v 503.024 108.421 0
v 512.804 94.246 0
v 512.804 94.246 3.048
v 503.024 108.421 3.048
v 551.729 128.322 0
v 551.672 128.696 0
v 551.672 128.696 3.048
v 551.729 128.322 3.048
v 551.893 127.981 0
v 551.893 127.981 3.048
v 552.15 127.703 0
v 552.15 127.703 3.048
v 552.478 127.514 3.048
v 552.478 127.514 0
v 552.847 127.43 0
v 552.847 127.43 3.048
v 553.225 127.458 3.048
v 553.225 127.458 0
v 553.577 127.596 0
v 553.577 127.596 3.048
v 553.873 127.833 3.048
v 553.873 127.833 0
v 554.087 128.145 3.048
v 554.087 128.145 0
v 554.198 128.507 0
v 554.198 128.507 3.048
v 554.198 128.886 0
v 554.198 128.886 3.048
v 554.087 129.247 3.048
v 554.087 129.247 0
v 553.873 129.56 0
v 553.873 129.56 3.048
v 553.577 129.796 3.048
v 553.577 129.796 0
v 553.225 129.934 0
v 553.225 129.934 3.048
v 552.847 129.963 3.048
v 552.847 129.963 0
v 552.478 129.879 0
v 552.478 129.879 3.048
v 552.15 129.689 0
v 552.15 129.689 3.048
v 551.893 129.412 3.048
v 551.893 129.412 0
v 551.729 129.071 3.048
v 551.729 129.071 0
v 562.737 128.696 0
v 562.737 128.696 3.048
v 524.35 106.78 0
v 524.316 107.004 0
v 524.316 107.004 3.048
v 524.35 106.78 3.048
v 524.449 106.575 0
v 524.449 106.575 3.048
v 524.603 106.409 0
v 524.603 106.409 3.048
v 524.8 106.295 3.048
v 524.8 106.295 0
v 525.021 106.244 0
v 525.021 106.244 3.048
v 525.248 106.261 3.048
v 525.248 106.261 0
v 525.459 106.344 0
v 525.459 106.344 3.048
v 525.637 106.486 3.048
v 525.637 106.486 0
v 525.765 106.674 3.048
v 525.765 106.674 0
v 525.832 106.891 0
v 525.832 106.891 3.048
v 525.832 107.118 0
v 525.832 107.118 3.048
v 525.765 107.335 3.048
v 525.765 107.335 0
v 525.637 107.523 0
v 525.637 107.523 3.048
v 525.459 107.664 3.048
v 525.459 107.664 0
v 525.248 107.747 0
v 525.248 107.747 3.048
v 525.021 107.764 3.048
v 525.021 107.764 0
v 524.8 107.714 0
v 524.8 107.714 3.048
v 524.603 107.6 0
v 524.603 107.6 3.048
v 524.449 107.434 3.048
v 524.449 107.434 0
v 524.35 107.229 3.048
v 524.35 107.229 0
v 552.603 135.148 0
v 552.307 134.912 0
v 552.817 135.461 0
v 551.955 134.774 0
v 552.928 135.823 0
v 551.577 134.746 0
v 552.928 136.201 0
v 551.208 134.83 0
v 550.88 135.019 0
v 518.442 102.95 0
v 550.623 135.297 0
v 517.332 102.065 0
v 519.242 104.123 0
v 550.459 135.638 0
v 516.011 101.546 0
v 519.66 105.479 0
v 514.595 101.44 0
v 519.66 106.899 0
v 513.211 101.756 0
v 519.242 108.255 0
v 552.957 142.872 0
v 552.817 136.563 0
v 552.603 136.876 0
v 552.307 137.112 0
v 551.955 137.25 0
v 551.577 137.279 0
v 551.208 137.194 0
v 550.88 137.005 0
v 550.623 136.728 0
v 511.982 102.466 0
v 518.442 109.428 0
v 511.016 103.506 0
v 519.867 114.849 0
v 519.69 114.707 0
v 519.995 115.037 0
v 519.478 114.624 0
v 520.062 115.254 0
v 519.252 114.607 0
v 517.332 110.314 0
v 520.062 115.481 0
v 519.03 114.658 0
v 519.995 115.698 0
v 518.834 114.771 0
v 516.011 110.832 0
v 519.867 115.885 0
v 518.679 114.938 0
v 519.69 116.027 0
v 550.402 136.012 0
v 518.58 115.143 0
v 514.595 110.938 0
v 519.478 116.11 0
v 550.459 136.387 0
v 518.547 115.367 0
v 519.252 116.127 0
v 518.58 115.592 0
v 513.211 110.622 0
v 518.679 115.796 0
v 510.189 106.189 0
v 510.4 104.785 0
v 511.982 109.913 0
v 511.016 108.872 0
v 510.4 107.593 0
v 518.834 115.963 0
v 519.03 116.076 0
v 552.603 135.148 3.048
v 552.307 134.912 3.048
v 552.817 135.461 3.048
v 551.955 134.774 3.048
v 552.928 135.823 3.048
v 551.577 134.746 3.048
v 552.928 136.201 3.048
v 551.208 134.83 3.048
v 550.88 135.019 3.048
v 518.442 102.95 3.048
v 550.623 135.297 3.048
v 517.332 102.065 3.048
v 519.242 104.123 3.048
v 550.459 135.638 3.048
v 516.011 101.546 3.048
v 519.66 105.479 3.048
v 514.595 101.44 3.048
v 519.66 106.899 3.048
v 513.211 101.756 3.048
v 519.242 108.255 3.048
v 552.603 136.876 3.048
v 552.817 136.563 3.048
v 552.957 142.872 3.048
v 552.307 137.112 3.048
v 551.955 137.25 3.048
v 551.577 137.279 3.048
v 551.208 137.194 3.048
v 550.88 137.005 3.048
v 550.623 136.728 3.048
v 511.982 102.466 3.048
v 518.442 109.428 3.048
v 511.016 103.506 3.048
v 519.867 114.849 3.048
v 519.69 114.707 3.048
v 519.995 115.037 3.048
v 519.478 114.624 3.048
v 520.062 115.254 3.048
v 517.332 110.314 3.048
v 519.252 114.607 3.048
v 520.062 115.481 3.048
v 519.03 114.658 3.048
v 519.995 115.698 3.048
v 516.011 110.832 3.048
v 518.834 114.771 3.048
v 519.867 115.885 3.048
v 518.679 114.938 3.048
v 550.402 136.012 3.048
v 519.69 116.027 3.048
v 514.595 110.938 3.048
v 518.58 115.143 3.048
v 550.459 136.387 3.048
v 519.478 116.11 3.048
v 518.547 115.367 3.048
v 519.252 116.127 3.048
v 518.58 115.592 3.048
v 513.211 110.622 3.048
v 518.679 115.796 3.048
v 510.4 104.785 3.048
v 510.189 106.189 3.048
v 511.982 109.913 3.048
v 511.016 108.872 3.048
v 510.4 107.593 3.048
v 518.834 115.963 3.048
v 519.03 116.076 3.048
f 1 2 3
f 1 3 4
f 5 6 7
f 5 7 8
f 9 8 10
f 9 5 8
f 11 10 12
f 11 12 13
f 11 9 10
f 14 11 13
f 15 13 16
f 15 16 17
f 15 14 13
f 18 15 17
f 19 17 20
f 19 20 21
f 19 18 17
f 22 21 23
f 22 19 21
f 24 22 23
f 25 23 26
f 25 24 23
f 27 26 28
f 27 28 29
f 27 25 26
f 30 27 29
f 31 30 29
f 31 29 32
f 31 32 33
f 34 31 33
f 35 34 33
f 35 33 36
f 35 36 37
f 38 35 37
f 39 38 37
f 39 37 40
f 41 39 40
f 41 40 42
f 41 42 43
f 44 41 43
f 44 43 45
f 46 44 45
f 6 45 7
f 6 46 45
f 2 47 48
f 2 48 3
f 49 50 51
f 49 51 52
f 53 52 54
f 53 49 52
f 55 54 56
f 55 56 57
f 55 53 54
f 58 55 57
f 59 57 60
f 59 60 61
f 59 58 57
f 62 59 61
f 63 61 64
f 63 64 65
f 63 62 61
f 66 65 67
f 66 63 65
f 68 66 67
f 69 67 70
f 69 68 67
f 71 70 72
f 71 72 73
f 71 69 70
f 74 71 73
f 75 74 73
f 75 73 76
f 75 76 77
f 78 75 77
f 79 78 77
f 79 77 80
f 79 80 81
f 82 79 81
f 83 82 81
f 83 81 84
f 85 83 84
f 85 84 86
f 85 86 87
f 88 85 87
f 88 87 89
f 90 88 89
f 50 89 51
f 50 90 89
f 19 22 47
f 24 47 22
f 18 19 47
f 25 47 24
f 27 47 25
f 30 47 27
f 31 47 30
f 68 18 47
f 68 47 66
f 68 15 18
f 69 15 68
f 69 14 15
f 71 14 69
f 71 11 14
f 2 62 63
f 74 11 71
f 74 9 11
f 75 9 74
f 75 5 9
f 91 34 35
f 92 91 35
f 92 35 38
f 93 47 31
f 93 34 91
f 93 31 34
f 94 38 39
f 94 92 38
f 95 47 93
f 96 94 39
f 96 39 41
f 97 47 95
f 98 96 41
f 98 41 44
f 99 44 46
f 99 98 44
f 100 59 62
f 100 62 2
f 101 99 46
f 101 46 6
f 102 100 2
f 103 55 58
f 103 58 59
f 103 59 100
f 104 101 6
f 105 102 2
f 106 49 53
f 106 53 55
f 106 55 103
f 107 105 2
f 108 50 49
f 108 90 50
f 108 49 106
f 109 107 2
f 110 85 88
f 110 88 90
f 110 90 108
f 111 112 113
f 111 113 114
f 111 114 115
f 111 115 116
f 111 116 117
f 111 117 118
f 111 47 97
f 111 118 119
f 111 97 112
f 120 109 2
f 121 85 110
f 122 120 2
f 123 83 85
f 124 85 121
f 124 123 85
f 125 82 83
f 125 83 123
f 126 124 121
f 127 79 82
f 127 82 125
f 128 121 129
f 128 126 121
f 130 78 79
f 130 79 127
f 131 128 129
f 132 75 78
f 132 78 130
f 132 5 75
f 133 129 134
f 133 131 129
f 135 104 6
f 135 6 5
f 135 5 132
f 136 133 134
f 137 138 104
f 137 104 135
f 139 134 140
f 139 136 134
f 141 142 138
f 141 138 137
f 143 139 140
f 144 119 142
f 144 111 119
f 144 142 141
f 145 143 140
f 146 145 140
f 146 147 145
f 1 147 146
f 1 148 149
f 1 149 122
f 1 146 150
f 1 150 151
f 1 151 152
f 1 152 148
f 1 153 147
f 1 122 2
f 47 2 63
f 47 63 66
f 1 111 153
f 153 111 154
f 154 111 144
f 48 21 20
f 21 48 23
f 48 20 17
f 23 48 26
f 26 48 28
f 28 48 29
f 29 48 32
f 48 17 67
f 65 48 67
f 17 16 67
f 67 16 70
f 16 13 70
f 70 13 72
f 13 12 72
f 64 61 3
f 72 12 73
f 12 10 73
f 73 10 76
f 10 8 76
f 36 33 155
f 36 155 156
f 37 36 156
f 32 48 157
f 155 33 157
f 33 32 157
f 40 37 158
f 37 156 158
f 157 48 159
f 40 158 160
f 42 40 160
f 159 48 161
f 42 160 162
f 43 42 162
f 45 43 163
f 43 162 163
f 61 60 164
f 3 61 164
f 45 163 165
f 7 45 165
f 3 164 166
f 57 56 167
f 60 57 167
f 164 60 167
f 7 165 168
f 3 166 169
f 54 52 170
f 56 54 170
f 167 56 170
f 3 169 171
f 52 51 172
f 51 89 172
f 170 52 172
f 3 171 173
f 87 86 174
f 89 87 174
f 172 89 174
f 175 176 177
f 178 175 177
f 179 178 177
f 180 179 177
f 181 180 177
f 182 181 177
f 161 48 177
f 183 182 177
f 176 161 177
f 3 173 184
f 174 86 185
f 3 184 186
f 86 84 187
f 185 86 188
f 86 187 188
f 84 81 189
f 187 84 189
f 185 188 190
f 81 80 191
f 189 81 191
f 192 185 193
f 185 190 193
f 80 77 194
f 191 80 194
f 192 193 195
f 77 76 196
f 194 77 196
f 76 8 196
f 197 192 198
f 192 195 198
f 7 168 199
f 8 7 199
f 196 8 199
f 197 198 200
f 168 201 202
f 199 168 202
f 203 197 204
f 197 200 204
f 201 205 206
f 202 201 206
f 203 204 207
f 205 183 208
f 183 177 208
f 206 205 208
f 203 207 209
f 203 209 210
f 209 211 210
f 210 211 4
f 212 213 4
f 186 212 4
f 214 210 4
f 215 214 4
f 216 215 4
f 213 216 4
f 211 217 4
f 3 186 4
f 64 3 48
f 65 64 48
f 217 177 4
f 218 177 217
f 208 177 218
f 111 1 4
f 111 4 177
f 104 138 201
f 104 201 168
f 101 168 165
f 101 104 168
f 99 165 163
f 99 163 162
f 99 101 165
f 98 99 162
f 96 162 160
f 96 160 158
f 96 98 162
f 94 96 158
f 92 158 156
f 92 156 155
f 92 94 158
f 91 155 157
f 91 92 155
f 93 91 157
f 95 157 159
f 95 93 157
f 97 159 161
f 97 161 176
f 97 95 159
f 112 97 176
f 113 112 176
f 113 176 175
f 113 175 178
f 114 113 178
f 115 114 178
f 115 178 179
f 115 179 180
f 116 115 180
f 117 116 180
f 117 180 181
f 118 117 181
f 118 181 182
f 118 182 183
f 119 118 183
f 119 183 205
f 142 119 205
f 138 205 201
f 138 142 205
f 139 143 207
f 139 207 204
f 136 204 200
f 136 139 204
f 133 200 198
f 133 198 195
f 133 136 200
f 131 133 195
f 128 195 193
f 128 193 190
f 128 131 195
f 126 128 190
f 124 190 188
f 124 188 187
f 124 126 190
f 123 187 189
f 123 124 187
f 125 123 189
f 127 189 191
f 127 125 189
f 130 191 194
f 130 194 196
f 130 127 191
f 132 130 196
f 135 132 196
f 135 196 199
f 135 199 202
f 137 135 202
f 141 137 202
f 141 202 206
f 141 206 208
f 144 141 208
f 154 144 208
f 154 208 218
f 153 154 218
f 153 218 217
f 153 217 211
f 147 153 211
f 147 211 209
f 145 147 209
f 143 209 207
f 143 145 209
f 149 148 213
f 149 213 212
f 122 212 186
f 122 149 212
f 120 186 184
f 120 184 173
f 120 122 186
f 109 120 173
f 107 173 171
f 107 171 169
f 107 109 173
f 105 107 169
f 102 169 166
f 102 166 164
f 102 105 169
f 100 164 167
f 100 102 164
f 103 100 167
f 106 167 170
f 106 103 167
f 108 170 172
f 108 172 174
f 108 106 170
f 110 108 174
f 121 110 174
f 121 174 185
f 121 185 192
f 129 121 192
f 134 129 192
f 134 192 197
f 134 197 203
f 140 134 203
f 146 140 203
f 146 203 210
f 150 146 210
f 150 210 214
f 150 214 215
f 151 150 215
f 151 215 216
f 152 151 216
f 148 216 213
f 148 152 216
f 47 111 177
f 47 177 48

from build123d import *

# Parameters (mm, degrees)
SKETCH1_R           = 1.27
SKETCH1_R_2         = 4.7625
SKETCH1_R_3         = 0.762
BOSS_EXTRUDE1_DEPTH = 3.048


with BuildPart() as part:
    # Sketch1 → Boss-Extrude1 (new body)
    with BuildSketch(Plane.XY):
        Polygon((552.957131224, 142.871693799), (562.737035343, 128.696327154), (512.803524332, 94.246075371), (503.023620213, 108.421442016), align=None)
        with Locations(Location((551.672296834, 136.012198904, 0), (0, 0, 180))):
            Circle(SKETCH1_R, mode=Mode.SUBTRACT)
        with Locations(Location((552.942296834, 128.696327154, 0), (0, 0, 180))):
            Circle(SKETCH1_R, mode=Mode.SUBTRACT)
        with Locations(Location((514.95104564, 106.189069777, 0), (0, 0, 180))):
            Circle(SKETCH1_R_2, mode=Mode.SUBTRACT)
        with Locations(Location((519.308599463, 115.367159158, 0), (0, 0, 180))):
            Circle(SKETCH1_R_3, mode=Mode.SUBTRACT)
        with Locations(Location((525.078281113, 107.004362159, 0), (0, 0, 180))):
            Circle(SKETCH1_R_3, mode=Mode.SUBTRACT)
    extrude(amount=BOSS_EXTRUDE1_DEPTH)


solid = part.part
